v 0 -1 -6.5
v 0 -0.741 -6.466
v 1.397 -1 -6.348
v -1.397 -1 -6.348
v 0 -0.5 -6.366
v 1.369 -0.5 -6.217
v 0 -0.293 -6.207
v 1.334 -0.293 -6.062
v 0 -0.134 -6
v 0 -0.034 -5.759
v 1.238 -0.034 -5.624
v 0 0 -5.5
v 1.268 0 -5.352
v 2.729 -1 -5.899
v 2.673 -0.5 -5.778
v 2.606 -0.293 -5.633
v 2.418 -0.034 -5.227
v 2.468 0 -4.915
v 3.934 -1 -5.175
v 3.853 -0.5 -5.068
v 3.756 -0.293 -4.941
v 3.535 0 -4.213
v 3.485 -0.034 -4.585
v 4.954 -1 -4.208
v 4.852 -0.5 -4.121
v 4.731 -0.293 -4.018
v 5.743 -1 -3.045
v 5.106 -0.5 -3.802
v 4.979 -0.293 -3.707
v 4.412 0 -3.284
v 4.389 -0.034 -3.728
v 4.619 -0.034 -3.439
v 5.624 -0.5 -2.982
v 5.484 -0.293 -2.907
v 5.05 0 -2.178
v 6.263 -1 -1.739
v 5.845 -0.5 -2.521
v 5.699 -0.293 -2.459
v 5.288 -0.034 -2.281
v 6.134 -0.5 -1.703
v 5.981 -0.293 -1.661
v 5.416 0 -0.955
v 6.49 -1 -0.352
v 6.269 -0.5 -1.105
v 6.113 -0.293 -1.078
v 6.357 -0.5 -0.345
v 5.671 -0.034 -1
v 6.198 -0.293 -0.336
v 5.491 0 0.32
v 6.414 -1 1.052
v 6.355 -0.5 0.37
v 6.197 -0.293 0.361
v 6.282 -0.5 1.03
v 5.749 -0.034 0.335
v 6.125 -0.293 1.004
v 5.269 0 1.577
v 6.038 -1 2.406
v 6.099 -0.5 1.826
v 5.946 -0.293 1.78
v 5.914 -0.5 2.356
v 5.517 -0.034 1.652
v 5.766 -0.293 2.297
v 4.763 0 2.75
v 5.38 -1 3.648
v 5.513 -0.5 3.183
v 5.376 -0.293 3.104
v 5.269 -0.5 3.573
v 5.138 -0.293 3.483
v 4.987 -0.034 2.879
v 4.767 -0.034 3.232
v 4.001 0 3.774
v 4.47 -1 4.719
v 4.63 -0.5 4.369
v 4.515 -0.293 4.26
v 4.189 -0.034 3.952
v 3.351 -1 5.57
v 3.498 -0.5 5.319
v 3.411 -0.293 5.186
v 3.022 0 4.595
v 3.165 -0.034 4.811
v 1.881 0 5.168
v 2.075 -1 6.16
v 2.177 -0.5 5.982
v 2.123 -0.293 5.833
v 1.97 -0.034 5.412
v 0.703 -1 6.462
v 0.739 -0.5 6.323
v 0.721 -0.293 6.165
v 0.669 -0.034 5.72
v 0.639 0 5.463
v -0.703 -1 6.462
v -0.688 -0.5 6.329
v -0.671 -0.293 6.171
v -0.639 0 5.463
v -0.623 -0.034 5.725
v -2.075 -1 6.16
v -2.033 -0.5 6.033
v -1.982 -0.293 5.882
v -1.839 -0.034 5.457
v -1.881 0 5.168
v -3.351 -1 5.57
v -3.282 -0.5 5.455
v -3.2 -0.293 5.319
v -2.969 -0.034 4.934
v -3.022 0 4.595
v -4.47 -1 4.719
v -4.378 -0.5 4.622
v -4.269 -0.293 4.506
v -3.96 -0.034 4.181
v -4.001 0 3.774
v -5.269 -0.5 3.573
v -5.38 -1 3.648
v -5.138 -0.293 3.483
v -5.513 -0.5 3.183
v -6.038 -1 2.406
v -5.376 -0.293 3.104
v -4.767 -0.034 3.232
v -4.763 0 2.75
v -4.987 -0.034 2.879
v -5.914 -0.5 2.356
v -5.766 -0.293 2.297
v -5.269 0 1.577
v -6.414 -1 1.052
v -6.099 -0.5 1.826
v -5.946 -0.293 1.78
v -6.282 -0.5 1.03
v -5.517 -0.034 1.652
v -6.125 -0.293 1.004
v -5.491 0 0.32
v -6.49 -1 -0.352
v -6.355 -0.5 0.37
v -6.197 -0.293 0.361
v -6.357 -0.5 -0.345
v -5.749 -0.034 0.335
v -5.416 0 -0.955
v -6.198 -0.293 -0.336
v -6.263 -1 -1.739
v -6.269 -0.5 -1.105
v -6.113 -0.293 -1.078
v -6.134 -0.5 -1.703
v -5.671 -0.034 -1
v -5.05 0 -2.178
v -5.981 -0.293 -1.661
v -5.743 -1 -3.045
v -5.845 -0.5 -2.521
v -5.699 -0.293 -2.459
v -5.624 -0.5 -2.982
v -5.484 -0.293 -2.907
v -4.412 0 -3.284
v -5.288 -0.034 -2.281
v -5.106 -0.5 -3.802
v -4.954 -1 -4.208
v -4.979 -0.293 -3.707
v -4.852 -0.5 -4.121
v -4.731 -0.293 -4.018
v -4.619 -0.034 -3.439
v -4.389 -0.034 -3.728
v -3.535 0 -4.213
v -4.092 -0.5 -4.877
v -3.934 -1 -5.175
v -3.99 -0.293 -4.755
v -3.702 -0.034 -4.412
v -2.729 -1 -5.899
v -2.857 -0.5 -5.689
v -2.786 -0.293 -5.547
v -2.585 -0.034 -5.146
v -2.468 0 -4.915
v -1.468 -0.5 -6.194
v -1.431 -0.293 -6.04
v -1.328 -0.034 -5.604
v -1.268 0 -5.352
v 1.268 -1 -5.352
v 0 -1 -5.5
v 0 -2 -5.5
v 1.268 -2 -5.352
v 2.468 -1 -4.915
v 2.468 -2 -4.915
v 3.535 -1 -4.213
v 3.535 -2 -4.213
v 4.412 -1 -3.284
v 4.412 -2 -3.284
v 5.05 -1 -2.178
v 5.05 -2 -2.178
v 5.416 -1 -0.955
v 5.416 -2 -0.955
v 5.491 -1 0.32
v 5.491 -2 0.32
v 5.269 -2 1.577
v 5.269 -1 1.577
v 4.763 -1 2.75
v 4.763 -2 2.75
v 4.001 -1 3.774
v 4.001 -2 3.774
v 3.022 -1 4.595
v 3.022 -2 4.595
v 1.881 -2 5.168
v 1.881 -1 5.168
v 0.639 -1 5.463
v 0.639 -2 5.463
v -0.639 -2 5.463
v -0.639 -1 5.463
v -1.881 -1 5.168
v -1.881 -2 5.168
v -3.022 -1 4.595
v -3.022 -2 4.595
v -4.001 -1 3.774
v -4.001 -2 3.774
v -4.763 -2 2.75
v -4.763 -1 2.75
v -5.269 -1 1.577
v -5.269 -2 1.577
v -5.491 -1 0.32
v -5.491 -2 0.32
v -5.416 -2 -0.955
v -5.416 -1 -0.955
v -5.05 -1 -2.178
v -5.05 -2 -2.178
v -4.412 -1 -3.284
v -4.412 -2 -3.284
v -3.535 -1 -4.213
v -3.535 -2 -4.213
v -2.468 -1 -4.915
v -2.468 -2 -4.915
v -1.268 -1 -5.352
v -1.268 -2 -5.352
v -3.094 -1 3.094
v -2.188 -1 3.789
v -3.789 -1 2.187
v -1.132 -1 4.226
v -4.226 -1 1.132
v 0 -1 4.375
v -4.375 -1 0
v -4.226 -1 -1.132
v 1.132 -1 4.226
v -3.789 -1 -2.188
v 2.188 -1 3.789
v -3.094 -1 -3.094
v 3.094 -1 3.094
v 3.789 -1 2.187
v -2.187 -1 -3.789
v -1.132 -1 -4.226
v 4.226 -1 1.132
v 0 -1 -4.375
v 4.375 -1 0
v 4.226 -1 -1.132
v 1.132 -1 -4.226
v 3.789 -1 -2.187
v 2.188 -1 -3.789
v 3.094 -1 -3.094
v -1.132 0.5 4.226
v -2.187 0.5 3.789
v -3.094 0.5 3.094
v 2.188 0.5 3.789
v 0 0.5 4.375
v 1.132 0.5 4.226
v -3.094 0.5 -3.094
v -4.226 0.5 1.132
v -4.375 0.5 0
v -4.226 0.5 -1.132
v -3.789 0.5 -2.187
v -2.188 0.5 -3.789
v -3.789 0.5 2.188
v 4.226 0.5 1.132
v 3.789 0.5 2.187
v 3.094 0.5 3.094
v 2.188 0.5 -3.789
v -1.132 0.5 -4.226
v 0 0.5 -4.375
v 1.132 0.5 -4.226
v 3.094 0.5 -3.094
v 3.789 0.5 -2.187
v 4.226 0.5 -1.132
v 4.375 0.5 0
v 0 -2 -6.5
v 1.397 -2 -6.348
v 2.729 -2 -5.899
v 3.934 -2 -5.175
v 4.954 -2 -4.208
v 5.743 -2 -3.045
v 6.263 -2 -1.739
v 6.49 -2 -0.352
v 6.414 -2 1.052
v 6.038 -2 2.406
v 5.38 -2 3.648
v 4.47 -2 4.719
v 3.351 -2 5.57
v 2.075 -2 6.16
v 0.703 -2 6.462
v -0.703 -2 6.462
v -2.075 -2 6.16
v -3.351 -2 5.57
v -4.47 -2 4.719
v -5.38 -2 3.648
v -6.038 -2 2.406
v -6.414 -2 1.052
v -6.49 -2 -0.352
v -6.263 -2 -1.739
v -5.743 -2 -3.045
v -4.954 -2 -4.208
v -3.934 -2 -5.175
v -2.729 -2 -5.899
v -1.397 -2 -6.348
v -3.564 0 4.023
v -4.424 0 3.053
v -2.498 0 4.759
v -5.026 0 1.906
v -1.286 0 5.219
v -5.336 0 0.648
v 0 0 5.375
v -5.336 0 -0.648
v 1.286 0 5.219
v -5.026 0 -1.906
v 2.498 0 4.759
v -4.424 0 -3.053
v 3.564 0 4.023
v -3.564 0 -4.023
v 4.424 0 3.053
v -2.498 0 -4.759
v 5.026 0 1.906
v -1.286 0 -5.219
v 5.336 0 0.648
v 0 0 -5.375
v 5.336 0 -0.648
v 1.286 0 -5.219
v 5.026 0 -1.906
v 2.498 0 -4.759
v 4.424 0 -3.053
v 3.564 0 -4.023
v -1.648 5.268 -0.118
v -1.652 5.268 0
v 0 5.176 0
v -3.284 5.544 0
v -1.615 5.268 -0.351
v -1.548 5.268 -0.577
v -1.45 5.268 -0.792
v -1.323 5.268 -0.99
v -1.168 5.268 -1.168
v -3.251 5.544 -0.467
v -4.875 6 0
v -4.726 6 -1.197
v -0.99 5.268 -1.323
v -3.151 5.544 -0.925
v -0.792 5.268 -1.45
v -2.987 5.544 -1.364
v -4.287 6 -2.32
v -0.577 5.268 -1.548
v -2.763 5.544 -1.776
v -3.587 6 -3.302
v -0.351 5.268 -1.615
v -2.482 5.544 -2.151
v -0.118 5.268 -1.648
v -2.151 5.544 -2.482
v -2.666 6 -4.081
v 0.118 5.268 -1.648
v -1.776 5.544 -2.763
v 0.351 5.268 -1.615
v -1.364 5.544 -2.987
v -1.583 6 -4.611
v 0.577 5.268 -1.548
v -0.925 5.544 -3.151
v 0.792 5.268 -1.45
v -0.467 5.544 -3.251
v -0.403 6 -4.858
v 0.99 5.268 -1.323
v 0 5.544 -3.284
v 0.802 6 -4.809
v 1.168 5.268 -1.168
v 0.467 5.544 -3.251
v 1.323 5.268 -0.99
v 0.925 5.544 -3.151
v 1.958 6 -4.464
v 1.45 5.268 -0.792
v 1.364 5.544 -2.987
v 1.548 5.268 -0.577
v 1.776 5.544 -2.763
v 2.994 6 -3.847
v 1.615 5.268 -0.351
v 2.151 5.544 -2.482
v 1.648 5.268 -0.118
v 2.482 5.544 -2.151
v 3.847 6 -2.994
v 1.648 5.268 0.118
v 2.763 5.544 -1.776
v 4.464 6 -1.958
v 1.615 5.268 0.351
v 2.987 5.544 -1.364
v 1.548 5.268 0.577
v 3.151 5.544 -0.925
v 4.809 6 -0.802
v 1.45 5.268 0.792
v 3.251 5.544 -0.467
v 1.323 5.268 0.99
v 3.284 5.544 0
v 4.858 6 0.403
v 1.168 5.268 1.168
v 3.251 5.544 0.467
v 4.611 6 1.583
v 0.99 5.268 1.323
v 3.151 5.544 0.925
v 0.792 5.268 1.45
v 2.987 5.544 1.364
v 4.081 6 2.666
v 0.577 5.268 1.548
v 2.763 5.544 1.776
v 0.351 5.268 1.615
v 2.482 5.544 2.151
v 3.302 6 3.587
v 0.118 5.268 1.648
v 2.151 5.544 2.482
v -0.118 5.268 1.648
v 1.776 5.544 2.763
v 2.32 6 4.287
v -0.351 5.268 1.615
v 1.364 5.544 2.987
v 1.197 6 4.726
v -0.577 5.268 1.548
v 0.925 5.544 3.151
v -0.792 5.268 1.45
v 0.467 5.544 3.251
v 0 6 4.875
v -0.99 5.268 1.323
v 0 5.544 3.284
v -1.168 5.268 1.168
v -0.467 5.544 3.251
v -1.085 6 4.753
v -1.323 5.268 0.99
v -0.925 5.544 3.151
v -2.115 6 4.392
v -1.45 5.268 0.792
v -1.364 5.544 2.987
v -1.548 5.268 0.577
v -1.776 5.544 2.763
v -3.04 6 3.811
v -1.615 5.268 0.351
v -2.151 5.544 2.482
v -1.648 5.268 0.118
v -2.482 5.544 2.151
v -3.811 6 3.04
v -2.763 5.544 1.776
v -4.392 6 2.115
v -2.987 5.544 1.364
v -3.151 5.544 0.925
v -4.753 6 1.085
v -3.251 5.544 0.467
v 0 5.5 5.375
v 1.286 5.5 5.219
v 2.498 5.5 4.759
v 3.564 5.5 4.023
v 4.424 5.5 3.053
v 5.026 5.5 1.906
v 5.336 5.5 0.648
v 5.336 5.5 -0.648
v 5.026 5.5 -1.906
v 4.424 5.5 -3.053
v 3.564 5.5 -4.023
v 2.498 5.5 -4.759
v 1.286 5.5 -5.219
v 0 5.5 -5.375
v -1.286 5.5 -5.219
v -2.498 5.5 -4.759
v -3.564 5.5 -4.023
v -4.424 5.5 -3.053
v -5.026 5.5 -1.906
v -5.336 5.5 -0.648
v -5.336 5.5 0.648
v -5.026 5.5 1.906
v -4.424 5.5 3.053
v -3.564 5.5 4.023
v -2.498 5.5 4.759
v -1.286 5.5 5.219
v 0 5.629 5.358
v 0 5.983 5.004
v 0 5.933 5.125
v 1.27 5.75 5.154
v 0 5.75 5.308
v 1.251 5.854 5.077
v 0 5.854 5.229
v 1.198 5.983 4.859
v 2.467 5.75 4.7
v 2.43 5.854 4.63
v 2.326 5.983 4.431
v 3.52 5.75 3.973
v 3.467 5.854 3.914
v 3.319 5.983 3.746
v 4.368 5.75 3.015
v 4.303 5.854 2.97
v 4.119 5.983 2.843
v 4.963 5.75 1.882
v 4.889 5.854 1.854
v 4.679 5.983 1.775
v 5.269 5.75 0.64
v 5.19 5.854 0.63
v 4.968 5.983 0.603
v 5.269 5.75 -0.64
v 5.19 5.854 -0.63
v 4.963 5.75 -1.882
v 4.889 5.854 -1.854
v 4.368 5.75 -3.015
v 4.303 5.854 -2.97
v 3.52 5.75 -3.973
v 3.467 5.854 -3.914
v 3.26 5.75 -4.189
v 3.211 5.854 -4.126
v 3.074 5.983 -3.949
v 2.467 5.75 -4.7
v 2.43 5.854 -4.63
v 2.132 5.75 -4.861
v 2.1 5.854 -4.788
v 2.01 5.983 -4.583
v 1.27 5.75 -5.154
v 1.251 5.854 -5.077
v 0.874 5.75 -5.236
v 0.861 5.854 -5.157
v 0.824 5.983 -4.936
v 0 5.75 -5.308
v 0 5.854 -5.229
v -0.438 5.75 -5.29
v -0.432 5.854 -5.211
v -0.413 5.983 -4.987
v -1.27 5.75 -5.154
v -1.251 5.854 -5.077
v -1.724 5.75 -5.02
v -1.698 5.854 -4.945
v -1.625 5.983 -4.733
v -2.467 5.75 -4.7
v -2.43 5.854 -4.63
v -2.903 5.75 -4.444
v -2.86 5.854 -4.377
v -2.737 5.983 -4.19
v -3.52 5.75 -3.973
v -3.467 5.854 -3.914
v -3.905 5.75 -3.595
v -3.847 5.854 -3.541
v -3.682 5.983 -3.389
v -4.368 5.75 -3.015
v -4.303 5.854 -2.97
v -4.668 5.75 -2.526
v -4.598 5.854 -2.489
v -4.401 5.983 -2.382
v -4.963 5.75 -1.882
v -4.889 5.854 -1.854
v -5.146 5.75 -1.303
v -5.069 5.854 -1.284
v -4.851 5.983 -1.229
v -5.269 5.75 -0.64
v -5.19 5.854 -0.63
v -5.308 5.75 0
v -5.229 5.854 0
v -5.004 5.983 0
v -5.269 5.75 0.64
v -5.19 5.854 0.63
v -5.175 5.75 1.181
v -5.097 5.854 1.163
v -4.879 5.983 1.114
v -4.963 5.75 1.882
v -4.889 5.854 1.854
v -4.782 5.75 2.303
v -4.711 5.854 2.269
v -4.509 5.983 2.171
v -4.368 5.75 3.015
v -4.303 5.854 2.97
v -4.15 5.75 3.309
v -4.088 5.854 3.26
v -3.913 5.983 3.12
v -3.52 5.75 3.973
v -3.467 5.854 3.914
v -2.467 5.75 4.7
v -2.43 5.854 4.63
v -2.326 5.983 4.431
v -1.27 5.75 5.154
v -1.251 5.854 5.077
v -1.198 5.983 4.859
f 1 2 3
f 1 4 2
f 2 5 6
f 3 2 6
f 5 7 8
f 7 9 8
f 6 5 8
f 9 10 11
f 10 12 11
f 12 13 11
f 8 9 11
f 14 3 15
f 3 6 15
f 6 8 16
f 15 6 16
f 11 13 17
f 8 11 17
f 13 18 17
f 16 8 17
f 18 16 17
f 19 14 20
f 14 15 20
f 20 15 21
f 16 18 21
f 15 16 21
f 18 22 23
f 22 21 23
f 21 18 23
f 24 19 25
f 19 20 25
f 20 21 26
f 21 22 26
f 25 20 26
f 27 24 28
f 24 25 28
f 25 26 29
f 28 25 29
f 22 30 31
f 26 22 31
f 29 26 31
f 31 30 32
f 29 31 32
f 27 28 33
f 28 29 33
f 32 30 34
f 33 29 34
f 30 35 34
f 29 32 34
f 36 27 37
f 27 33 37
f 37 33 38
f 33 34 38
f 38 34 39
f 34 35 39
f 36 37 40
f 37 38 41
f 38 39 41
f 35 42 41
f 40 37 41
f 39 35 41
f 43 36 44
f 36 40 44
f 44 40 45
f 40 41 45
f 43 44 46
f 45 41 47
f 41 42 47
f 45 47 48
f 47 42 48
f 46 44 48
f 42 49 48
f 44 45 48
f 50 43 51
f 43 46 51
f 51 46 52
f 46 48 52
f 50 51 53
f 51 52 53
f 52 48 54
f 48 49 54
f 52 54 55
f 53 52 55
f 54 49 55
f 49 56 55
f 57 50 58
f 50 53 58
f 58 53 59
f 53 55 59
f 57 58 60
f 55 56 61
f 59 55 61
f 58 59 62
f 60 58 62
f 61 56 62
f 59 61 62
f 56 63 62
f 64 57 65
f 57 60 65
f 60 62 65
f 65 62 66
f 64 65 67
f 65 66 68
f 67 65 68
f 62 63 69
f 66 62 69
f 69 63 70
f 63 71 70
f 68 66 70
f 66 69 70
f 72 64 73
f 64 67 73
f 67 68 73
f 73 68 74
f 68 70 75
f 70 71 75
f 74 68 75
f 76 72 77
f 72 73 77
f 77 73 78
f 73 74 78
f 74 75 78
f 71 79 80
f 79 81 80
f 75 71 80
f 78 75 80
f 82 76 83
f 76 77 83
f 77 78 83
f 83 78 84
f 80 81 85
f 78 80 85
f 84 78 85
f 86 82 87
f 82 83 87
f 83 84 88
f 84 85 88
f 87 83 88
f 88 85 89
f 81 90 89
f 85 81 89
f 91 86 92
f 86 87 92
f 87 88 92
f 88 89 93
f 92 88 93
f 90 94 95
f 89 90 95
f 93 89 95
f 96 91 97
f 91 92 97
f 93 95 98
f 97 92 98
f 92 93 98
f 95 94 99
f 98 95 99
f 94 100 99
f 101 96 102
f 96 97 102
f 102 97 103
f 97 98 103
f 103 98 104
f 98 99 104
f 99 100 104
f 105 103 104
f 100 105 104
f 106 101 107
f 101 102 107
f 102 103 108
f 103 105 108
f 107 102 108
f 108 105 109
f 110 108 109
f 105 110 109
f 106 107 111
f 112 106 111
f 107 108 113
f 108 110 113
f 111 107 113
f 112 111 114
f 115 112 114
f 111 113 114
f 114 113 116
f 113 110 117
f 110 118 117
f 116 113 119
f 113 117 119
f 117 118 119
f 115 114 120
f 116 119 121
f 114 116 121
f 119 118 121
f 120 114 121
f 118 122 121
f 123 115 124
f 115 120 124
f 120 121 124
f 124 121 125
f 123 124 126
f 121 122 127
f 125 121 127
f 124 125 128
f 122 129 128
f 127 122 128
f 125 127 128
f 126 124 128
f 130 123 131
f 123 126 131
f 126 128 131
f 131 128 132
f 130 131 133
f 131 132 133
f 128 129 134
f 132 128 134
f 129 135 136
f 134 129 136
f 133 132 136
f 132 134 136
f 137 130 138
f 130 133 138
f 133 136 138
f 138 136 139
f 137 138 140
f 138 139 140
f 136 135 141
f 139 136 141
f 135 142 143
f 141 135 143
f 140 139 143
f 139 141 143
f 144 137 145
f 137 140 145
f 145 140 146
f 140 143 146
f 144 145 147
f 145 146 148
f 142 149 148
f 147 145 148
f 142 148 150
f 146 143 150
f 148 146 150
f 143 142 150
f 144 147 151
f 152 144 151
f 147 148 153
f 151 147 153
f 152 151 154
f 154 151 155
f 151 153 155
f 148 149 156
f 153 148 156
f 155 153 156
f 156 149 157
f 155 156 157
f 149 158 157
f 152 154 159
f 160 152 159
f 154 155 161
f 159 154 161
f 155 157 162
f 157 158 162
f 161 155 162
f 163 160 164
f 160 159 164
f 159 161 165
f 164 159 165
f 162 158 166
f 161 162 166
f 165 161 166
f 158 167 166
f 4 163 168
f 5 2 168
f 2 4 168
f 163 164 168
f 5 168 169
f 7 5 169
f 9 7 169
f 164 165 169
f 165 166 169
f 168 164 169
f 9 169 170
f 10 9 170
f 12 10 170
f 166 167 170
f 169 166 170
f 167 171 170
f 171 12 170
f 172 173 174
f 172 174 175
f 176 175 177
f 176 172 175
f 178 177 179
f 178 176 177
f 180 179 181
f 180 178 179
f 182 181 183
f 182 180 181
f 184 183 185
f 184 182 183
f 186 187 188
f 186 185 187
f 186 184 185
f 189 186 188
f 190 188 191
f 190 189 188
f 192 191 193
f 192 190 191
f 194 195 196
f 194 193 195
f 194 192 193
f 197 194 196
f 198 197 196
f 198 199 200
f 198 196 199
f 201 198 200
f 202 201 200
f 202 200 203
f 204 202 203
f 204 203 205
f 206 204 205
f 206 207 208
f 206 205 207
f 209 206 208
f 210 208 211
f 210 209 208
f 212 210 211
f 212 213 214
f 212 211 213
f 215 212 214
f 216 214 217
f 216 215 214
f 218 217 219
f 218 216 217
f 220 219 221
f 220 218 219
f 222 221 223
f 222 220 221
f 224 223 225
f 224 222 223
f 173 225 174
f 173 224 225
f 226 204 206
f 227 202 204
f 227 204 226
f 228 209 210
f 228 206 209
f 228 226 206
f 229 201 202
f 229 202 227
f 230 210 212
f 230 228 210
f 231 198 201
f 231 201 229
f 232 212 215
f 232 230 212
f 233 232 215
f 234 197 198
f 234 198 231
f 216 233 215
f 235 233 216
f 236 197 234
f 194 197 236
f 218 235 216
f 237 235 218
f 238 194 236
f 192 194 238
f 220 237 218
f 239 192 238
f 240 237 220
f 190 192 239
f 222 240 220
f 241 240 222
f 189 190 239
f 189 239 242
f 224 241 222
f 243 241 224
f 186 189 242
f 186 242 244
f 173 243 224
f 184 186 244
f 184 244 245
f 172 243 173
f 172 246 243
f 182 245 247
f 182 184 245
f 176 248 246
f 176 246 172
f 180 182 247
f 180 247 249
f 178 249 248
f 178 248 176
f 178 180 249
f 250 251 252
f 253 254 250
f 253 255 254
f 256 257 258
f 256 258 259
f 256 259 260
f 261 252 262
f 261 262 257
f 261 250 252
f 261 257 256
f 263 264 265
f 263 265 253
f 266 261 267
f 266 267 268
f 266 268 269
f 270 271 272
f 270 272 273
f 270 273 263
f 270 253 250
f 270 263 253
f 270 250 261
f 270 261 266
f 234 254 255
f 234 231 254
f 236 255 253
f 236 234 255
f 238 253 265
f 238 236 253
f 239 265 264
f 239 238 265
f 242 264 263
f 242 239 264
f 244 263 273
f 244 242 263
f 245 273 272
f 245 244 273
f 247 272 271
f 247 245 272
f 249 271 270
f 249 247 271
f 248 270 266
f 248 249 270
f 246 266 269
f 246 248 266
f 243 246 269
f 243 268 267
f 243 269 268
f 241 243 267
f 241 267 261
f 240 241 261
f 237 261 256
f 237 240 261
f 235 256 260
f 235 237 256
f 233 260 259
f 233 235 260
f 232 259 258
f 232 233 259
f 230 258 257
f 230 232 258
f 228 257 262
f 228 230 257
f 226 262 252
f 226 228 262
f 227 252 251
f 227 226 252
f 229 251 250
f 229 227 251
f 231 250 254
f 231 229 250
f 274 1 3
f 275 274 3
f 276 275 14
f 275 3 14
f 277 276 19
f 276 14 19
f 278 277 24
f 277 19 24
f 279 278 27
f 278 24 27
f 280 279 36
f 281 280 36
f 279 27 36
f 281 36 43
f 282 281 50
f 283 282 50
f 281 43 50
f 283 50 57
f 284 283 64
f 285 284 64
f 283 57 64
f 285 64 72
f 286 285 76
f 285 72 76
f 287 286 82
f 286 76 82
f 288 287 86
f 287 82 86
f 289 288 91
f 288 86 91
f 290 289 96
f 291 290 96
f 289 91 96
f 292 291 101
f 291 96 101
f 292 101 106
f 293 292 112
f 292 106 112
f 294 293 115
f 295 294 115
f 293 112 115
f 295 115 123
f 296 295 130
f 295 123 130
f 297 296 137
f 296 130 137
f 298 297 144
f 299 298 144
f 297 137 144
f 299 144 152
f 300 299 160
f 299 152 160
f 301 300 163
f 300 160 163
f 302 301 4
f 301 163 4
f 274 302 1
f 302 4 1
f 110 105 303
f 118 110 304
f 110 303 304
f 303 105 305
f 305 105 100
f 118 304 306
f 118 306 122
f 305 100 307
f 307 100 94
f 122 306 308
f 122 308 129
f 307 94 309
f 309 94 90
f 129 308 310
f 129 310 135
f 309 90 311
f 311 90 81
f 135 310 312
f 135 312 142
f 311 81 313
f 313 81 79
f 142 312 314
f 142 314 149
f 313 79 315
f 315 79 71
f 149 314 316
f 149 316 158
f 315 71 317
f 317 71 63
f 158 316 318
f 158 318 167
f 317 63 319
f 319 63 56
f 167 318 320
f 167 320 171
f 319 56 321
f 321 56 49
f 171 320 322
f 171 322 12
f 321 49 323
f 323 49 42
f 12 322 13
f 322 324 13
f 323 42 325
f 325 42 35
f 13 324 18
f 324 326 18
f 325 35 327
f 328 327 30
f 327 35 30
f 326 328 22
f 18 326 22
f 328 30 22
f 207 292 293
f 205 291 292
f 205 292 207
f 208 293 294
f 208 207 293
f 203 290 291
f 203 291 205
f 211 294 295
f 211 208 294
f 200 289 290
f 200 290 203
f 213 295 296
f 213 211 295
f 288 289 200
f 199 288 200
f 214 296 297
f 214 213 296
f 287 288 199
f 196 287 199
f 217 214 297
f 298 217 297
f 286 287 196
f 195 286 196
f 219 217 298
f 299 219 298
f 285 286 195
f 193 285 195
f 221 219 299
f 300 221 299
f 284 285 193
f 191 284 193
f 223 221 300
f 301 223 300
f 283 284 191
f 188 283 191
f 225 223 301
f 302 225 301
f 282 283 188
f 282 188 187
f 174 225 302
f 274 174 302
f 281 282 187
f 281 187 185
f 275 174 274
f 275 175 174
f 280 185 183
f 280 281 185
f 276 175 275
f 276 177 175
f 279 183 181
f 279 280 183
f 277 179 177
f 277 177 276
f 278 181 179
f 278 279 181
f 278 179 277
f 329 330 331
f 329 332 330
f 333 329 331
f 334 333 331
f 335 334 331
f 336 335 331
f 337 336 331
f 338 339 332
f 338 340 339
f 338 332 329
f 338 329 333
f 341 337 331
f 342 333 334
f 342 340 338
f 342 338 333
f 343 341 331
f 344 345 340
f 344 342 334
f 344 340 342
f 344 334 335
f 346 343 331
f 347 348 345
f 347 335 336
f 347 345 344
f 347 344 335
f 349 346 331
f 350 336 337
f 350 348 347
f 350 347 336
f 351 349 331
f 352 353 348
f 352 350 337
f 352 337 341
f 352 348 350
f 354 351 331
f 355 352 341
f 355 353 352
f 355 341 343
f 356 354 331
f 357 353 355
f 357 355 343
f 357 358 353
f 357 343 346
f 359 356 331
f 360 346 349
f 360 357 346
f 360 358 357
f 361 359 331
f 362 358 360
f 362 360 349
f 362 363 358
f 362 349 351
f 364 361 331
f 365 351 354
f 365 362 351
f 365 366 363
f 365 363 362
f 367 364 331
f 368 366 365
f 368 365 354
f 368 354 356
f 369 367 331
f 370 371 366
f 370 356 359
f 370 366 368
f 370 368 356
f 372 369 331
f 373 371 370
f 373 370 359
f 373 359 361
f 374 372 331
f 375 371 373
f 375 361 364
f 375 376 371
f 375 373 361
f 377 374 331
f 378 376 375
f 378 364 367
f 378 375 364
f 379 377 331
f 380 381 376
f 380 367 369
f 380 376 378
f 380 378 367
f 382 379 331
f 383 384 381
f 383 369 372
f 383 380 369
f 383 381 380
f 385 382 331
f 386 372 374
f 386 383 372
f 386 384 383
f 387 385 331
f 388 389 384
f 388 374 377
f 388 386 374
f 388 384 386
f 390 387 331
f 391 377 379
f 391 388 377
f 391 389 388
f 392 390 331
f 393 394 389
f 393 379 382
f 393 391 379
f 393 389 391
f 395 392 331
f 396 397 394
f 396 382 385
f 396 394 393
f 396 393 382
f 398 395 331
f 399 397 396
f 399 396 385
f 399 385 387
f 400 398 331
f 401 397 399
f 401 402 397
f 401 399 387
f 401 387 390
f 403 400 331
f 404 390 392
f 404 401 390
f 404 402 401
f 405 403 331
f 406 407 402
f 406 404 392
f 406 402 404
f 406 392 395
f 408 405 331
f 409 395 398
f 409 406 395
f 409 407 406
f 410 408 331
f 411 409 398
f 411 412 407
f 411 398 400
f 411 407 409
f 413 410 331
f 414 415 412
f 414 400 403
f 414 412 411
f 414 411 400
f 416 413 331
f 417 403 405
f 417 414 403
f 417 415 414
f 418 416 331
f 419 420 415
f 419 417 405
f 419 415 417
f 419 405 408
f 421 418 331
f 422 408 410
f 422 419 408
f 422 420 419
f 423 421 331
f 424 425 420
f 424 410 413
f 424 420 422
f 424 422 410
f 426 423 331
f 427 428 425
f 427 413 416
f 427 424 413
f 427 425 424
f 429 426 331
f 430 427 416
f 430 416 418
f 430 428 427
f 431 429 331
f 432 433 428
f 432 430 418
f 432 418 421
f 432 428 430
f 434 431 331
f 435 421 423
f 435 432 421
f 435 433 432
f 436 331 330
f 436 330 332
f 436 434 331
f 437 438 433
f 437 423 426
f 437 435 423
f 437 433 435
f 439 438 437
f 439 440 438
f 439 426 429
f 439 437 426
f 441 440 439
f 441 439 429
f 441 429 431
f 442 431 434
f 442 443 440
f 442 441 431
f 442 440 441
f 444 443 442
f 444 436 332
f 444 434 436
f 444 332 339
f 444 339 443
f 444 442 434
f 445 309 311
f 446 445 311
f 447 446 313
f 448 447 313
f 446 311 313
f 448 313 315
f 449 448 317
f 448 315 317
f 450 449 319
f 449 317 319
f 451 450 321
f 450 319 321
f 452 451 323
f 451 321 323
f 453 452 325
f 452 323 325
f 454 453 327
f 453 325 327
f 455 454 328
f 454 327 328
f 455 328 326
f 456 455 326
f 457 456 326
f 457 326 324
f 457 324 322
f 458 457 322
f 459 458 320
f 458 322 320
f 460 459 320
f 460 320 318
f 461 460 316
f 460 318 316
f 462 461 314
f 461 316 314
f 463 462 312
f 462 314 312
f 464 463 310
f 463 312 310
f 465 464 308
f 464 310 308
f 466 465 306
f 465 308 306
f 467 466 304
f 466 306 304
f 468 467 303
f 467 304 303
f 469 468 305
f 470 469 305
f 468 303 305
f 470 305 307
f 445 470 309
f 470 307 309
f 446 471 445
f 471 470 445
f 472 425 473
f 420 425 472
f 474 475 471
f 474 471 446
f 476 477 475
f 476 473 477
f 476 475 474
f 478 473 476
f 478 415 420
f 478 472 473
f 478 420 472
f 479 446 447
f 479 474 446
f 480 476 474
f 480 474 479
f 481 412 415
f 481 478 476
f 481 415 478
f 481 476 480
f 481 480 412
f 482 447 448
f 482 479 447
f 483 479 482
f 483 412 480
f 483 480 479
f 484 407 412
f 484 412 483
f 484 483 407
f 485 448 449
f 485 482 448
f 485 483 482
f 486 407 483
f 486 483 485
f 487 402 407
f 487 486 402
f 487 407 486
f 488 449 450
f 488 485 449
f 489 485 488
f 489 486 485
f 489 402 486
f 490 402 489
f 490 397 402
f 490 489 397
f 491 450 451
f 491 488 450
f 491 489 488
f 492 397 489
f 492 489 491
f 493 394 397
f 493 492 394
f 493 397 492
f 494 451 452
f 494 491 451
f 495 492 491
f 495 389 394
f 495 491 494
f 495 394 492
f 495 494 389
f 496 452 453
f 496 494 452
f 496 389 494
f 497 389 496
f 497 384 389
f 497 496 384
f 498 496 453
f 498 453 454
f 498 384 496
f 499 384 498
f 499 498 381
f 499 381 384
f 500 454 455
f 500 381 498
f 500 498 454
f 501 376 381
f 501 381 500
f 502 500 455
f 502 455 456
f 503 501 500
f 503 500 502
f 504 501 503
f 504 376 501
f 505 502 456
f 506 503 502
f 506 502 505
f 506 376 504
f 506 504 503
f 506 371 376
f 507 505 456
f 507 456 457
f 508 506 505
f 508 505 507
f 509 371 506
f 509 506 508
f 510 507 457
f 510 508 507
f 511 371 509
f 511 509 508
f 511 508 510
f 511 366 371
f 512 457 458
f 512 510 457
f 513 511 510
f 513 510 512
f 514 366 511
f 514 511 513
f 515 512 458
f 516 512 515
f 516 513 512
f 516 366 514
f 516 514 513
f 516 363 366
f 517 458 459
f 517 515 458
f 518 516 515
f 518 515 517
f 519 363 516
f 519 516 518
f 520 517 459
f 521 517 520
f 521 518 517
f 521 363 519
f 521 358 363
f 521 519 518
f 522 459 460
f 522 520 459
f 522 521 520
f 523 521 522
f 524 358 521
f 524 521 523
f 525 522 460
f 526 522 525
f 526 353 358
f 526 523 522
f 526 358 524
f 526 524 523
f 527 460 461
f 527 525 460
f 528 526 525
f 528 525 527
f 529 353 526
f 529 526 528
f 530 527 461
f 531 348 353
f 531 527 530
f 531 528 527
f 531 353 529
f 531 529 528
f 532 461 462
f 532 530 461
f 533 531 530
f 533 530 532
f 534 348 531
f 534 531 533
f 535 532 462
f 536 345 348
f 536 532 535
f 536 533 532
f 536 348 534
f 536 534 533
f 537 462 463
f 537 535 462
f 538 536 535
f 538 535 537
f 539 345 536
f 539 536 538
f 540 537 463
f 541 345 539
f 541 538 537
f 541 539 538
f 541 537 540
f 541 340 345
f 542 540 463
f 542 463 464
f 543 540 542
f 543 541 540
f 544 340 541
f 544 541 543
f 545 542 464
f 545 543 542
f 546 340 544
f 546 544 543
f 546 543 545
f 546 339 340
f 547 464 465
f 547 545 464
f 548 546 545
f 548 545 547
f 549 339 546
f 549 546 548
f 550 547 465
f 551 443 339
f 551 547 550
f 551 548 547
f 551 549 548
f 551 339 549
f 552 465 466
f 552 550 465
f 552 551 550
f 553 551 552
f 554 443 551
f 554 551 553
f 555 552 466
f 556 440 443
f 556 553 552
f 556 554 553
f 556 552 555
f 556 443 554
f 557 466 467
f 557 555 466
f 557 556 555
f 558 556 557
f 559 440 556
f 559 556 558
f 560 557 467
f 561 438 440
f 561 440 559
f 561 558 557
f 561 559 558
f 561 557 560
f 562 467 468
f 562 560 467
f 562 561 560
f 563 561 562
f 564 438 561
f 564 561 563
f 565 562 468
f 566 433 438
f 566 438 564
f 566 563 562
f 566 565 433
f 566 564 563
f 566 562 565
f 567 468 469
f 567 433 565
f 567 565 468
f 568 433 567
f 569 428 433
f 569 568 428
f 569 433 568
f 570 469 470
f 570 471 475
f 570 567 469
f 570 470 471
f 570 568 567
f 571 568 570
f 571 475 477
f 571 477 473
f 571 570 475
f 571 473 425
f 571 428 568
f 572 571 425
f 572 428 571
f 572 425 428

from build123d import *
from OCP.BRepFilletAPI import BRepFilletAPI_MakeFillet

# Parameters (mm, degrees)
CROQUIS1_R              = 5.375
SALIENTE_EXTRUIR1_DEPTH = 6
CROQUIS2_R              = 6.5
SALIENTE_EXTRUIR2_DEPTH = 2
VACIADO1_T              = -1
SALIENTE_EXTRUIR3_START = 4.5
CROQUIS3_R              = 4.375
SALIENTE_EXTRUIR3_DEPTH = 4.5
REDONDEO1_R1            = 0.5
REDONDEO1_R2            = 1


with BuildPart() as part:
    # Croquis1 → Saliente-Extruir1 (new body)
    with BuildSketch(Plane(origin=(0, 0, 0), x_dir=(1, 0, 0), z_dir=(0, 1, 0))):
        Circle(CROQUIS1_R)
    extrude(amount=SALIENTE_EXTRUIR1_DEPTH)

    # Croquis2 → Saliente-Extruir2 (add)
    with BuildSketch(Plane.XZ):
        Circle(CROQUIS2_R)
    extrude(amount=SALIENTE_EXTRUIR2_DEPTH)

    # Vaciado1
    vaciado1_openings = [part.faces().sort_by_distance(p)[0] for p in [
        (0, -2, 0),
    ]]
    offset(amount=VACIADO1_T, openings=vaciado1_openings, kind=Kind.INTERSECTION)

    # Croquis3 → Saliente-Extruir3 (add)
    with BuildSketch(Plane.XZ.offset(-5).offset(SALIENTE_EXTRUIR3_START)):
        Circle(CROQUIS3_R)
    extrude(amount=-SALIENTE_EXTRUIR3_DEPTH)

    # Redondeo1: one fillet with a radius per group of edges: ONE call of the kernel's fillet builder (fillet() takes one radius for all edges)
    redondeo1_edges_1 = [part.edges().sort_by_distance(p)[0] for p in [
        (-5.375, 6, 0),
    ]]
    redondeo1_edges_2 = [part.edges().sort_by_distance(p)[0] for p in [
        (-6.5, 0, 0),
    ]]
    redondeo1 = BRepFilletAPI_MakeFillet(part.part.solid().wrapped)
    for e in redondeo1_edges_1:
        redondeo1.Add(REDONDEO1_R1, e.wrapped)
    for e in redondeo1_edges_2:
        redondeo1.Add(REDONDEO1_R2, e.wrapped)
    add(Compound.cast(redondeo1.Shape()), mode=Mode.REPLACE)

    # Croquis4 → Cortar-Revolución4 (revolve, cut)
    with BuildSketch(Plane.XY):
        with BuildLine():
            Line((0, 20), (0, 5.175505911))
            ThreePointArc((0, 5.175505911), (-14.824494089, 20), (0, 34.824494089))
            Line((0, 34.824494089), (0, 20))
        make_face()
    revolve(axis=Axis((0, 20, 0), (0, -1, 0)), mode=Mode.SUBTRACT)


solid = part.part
